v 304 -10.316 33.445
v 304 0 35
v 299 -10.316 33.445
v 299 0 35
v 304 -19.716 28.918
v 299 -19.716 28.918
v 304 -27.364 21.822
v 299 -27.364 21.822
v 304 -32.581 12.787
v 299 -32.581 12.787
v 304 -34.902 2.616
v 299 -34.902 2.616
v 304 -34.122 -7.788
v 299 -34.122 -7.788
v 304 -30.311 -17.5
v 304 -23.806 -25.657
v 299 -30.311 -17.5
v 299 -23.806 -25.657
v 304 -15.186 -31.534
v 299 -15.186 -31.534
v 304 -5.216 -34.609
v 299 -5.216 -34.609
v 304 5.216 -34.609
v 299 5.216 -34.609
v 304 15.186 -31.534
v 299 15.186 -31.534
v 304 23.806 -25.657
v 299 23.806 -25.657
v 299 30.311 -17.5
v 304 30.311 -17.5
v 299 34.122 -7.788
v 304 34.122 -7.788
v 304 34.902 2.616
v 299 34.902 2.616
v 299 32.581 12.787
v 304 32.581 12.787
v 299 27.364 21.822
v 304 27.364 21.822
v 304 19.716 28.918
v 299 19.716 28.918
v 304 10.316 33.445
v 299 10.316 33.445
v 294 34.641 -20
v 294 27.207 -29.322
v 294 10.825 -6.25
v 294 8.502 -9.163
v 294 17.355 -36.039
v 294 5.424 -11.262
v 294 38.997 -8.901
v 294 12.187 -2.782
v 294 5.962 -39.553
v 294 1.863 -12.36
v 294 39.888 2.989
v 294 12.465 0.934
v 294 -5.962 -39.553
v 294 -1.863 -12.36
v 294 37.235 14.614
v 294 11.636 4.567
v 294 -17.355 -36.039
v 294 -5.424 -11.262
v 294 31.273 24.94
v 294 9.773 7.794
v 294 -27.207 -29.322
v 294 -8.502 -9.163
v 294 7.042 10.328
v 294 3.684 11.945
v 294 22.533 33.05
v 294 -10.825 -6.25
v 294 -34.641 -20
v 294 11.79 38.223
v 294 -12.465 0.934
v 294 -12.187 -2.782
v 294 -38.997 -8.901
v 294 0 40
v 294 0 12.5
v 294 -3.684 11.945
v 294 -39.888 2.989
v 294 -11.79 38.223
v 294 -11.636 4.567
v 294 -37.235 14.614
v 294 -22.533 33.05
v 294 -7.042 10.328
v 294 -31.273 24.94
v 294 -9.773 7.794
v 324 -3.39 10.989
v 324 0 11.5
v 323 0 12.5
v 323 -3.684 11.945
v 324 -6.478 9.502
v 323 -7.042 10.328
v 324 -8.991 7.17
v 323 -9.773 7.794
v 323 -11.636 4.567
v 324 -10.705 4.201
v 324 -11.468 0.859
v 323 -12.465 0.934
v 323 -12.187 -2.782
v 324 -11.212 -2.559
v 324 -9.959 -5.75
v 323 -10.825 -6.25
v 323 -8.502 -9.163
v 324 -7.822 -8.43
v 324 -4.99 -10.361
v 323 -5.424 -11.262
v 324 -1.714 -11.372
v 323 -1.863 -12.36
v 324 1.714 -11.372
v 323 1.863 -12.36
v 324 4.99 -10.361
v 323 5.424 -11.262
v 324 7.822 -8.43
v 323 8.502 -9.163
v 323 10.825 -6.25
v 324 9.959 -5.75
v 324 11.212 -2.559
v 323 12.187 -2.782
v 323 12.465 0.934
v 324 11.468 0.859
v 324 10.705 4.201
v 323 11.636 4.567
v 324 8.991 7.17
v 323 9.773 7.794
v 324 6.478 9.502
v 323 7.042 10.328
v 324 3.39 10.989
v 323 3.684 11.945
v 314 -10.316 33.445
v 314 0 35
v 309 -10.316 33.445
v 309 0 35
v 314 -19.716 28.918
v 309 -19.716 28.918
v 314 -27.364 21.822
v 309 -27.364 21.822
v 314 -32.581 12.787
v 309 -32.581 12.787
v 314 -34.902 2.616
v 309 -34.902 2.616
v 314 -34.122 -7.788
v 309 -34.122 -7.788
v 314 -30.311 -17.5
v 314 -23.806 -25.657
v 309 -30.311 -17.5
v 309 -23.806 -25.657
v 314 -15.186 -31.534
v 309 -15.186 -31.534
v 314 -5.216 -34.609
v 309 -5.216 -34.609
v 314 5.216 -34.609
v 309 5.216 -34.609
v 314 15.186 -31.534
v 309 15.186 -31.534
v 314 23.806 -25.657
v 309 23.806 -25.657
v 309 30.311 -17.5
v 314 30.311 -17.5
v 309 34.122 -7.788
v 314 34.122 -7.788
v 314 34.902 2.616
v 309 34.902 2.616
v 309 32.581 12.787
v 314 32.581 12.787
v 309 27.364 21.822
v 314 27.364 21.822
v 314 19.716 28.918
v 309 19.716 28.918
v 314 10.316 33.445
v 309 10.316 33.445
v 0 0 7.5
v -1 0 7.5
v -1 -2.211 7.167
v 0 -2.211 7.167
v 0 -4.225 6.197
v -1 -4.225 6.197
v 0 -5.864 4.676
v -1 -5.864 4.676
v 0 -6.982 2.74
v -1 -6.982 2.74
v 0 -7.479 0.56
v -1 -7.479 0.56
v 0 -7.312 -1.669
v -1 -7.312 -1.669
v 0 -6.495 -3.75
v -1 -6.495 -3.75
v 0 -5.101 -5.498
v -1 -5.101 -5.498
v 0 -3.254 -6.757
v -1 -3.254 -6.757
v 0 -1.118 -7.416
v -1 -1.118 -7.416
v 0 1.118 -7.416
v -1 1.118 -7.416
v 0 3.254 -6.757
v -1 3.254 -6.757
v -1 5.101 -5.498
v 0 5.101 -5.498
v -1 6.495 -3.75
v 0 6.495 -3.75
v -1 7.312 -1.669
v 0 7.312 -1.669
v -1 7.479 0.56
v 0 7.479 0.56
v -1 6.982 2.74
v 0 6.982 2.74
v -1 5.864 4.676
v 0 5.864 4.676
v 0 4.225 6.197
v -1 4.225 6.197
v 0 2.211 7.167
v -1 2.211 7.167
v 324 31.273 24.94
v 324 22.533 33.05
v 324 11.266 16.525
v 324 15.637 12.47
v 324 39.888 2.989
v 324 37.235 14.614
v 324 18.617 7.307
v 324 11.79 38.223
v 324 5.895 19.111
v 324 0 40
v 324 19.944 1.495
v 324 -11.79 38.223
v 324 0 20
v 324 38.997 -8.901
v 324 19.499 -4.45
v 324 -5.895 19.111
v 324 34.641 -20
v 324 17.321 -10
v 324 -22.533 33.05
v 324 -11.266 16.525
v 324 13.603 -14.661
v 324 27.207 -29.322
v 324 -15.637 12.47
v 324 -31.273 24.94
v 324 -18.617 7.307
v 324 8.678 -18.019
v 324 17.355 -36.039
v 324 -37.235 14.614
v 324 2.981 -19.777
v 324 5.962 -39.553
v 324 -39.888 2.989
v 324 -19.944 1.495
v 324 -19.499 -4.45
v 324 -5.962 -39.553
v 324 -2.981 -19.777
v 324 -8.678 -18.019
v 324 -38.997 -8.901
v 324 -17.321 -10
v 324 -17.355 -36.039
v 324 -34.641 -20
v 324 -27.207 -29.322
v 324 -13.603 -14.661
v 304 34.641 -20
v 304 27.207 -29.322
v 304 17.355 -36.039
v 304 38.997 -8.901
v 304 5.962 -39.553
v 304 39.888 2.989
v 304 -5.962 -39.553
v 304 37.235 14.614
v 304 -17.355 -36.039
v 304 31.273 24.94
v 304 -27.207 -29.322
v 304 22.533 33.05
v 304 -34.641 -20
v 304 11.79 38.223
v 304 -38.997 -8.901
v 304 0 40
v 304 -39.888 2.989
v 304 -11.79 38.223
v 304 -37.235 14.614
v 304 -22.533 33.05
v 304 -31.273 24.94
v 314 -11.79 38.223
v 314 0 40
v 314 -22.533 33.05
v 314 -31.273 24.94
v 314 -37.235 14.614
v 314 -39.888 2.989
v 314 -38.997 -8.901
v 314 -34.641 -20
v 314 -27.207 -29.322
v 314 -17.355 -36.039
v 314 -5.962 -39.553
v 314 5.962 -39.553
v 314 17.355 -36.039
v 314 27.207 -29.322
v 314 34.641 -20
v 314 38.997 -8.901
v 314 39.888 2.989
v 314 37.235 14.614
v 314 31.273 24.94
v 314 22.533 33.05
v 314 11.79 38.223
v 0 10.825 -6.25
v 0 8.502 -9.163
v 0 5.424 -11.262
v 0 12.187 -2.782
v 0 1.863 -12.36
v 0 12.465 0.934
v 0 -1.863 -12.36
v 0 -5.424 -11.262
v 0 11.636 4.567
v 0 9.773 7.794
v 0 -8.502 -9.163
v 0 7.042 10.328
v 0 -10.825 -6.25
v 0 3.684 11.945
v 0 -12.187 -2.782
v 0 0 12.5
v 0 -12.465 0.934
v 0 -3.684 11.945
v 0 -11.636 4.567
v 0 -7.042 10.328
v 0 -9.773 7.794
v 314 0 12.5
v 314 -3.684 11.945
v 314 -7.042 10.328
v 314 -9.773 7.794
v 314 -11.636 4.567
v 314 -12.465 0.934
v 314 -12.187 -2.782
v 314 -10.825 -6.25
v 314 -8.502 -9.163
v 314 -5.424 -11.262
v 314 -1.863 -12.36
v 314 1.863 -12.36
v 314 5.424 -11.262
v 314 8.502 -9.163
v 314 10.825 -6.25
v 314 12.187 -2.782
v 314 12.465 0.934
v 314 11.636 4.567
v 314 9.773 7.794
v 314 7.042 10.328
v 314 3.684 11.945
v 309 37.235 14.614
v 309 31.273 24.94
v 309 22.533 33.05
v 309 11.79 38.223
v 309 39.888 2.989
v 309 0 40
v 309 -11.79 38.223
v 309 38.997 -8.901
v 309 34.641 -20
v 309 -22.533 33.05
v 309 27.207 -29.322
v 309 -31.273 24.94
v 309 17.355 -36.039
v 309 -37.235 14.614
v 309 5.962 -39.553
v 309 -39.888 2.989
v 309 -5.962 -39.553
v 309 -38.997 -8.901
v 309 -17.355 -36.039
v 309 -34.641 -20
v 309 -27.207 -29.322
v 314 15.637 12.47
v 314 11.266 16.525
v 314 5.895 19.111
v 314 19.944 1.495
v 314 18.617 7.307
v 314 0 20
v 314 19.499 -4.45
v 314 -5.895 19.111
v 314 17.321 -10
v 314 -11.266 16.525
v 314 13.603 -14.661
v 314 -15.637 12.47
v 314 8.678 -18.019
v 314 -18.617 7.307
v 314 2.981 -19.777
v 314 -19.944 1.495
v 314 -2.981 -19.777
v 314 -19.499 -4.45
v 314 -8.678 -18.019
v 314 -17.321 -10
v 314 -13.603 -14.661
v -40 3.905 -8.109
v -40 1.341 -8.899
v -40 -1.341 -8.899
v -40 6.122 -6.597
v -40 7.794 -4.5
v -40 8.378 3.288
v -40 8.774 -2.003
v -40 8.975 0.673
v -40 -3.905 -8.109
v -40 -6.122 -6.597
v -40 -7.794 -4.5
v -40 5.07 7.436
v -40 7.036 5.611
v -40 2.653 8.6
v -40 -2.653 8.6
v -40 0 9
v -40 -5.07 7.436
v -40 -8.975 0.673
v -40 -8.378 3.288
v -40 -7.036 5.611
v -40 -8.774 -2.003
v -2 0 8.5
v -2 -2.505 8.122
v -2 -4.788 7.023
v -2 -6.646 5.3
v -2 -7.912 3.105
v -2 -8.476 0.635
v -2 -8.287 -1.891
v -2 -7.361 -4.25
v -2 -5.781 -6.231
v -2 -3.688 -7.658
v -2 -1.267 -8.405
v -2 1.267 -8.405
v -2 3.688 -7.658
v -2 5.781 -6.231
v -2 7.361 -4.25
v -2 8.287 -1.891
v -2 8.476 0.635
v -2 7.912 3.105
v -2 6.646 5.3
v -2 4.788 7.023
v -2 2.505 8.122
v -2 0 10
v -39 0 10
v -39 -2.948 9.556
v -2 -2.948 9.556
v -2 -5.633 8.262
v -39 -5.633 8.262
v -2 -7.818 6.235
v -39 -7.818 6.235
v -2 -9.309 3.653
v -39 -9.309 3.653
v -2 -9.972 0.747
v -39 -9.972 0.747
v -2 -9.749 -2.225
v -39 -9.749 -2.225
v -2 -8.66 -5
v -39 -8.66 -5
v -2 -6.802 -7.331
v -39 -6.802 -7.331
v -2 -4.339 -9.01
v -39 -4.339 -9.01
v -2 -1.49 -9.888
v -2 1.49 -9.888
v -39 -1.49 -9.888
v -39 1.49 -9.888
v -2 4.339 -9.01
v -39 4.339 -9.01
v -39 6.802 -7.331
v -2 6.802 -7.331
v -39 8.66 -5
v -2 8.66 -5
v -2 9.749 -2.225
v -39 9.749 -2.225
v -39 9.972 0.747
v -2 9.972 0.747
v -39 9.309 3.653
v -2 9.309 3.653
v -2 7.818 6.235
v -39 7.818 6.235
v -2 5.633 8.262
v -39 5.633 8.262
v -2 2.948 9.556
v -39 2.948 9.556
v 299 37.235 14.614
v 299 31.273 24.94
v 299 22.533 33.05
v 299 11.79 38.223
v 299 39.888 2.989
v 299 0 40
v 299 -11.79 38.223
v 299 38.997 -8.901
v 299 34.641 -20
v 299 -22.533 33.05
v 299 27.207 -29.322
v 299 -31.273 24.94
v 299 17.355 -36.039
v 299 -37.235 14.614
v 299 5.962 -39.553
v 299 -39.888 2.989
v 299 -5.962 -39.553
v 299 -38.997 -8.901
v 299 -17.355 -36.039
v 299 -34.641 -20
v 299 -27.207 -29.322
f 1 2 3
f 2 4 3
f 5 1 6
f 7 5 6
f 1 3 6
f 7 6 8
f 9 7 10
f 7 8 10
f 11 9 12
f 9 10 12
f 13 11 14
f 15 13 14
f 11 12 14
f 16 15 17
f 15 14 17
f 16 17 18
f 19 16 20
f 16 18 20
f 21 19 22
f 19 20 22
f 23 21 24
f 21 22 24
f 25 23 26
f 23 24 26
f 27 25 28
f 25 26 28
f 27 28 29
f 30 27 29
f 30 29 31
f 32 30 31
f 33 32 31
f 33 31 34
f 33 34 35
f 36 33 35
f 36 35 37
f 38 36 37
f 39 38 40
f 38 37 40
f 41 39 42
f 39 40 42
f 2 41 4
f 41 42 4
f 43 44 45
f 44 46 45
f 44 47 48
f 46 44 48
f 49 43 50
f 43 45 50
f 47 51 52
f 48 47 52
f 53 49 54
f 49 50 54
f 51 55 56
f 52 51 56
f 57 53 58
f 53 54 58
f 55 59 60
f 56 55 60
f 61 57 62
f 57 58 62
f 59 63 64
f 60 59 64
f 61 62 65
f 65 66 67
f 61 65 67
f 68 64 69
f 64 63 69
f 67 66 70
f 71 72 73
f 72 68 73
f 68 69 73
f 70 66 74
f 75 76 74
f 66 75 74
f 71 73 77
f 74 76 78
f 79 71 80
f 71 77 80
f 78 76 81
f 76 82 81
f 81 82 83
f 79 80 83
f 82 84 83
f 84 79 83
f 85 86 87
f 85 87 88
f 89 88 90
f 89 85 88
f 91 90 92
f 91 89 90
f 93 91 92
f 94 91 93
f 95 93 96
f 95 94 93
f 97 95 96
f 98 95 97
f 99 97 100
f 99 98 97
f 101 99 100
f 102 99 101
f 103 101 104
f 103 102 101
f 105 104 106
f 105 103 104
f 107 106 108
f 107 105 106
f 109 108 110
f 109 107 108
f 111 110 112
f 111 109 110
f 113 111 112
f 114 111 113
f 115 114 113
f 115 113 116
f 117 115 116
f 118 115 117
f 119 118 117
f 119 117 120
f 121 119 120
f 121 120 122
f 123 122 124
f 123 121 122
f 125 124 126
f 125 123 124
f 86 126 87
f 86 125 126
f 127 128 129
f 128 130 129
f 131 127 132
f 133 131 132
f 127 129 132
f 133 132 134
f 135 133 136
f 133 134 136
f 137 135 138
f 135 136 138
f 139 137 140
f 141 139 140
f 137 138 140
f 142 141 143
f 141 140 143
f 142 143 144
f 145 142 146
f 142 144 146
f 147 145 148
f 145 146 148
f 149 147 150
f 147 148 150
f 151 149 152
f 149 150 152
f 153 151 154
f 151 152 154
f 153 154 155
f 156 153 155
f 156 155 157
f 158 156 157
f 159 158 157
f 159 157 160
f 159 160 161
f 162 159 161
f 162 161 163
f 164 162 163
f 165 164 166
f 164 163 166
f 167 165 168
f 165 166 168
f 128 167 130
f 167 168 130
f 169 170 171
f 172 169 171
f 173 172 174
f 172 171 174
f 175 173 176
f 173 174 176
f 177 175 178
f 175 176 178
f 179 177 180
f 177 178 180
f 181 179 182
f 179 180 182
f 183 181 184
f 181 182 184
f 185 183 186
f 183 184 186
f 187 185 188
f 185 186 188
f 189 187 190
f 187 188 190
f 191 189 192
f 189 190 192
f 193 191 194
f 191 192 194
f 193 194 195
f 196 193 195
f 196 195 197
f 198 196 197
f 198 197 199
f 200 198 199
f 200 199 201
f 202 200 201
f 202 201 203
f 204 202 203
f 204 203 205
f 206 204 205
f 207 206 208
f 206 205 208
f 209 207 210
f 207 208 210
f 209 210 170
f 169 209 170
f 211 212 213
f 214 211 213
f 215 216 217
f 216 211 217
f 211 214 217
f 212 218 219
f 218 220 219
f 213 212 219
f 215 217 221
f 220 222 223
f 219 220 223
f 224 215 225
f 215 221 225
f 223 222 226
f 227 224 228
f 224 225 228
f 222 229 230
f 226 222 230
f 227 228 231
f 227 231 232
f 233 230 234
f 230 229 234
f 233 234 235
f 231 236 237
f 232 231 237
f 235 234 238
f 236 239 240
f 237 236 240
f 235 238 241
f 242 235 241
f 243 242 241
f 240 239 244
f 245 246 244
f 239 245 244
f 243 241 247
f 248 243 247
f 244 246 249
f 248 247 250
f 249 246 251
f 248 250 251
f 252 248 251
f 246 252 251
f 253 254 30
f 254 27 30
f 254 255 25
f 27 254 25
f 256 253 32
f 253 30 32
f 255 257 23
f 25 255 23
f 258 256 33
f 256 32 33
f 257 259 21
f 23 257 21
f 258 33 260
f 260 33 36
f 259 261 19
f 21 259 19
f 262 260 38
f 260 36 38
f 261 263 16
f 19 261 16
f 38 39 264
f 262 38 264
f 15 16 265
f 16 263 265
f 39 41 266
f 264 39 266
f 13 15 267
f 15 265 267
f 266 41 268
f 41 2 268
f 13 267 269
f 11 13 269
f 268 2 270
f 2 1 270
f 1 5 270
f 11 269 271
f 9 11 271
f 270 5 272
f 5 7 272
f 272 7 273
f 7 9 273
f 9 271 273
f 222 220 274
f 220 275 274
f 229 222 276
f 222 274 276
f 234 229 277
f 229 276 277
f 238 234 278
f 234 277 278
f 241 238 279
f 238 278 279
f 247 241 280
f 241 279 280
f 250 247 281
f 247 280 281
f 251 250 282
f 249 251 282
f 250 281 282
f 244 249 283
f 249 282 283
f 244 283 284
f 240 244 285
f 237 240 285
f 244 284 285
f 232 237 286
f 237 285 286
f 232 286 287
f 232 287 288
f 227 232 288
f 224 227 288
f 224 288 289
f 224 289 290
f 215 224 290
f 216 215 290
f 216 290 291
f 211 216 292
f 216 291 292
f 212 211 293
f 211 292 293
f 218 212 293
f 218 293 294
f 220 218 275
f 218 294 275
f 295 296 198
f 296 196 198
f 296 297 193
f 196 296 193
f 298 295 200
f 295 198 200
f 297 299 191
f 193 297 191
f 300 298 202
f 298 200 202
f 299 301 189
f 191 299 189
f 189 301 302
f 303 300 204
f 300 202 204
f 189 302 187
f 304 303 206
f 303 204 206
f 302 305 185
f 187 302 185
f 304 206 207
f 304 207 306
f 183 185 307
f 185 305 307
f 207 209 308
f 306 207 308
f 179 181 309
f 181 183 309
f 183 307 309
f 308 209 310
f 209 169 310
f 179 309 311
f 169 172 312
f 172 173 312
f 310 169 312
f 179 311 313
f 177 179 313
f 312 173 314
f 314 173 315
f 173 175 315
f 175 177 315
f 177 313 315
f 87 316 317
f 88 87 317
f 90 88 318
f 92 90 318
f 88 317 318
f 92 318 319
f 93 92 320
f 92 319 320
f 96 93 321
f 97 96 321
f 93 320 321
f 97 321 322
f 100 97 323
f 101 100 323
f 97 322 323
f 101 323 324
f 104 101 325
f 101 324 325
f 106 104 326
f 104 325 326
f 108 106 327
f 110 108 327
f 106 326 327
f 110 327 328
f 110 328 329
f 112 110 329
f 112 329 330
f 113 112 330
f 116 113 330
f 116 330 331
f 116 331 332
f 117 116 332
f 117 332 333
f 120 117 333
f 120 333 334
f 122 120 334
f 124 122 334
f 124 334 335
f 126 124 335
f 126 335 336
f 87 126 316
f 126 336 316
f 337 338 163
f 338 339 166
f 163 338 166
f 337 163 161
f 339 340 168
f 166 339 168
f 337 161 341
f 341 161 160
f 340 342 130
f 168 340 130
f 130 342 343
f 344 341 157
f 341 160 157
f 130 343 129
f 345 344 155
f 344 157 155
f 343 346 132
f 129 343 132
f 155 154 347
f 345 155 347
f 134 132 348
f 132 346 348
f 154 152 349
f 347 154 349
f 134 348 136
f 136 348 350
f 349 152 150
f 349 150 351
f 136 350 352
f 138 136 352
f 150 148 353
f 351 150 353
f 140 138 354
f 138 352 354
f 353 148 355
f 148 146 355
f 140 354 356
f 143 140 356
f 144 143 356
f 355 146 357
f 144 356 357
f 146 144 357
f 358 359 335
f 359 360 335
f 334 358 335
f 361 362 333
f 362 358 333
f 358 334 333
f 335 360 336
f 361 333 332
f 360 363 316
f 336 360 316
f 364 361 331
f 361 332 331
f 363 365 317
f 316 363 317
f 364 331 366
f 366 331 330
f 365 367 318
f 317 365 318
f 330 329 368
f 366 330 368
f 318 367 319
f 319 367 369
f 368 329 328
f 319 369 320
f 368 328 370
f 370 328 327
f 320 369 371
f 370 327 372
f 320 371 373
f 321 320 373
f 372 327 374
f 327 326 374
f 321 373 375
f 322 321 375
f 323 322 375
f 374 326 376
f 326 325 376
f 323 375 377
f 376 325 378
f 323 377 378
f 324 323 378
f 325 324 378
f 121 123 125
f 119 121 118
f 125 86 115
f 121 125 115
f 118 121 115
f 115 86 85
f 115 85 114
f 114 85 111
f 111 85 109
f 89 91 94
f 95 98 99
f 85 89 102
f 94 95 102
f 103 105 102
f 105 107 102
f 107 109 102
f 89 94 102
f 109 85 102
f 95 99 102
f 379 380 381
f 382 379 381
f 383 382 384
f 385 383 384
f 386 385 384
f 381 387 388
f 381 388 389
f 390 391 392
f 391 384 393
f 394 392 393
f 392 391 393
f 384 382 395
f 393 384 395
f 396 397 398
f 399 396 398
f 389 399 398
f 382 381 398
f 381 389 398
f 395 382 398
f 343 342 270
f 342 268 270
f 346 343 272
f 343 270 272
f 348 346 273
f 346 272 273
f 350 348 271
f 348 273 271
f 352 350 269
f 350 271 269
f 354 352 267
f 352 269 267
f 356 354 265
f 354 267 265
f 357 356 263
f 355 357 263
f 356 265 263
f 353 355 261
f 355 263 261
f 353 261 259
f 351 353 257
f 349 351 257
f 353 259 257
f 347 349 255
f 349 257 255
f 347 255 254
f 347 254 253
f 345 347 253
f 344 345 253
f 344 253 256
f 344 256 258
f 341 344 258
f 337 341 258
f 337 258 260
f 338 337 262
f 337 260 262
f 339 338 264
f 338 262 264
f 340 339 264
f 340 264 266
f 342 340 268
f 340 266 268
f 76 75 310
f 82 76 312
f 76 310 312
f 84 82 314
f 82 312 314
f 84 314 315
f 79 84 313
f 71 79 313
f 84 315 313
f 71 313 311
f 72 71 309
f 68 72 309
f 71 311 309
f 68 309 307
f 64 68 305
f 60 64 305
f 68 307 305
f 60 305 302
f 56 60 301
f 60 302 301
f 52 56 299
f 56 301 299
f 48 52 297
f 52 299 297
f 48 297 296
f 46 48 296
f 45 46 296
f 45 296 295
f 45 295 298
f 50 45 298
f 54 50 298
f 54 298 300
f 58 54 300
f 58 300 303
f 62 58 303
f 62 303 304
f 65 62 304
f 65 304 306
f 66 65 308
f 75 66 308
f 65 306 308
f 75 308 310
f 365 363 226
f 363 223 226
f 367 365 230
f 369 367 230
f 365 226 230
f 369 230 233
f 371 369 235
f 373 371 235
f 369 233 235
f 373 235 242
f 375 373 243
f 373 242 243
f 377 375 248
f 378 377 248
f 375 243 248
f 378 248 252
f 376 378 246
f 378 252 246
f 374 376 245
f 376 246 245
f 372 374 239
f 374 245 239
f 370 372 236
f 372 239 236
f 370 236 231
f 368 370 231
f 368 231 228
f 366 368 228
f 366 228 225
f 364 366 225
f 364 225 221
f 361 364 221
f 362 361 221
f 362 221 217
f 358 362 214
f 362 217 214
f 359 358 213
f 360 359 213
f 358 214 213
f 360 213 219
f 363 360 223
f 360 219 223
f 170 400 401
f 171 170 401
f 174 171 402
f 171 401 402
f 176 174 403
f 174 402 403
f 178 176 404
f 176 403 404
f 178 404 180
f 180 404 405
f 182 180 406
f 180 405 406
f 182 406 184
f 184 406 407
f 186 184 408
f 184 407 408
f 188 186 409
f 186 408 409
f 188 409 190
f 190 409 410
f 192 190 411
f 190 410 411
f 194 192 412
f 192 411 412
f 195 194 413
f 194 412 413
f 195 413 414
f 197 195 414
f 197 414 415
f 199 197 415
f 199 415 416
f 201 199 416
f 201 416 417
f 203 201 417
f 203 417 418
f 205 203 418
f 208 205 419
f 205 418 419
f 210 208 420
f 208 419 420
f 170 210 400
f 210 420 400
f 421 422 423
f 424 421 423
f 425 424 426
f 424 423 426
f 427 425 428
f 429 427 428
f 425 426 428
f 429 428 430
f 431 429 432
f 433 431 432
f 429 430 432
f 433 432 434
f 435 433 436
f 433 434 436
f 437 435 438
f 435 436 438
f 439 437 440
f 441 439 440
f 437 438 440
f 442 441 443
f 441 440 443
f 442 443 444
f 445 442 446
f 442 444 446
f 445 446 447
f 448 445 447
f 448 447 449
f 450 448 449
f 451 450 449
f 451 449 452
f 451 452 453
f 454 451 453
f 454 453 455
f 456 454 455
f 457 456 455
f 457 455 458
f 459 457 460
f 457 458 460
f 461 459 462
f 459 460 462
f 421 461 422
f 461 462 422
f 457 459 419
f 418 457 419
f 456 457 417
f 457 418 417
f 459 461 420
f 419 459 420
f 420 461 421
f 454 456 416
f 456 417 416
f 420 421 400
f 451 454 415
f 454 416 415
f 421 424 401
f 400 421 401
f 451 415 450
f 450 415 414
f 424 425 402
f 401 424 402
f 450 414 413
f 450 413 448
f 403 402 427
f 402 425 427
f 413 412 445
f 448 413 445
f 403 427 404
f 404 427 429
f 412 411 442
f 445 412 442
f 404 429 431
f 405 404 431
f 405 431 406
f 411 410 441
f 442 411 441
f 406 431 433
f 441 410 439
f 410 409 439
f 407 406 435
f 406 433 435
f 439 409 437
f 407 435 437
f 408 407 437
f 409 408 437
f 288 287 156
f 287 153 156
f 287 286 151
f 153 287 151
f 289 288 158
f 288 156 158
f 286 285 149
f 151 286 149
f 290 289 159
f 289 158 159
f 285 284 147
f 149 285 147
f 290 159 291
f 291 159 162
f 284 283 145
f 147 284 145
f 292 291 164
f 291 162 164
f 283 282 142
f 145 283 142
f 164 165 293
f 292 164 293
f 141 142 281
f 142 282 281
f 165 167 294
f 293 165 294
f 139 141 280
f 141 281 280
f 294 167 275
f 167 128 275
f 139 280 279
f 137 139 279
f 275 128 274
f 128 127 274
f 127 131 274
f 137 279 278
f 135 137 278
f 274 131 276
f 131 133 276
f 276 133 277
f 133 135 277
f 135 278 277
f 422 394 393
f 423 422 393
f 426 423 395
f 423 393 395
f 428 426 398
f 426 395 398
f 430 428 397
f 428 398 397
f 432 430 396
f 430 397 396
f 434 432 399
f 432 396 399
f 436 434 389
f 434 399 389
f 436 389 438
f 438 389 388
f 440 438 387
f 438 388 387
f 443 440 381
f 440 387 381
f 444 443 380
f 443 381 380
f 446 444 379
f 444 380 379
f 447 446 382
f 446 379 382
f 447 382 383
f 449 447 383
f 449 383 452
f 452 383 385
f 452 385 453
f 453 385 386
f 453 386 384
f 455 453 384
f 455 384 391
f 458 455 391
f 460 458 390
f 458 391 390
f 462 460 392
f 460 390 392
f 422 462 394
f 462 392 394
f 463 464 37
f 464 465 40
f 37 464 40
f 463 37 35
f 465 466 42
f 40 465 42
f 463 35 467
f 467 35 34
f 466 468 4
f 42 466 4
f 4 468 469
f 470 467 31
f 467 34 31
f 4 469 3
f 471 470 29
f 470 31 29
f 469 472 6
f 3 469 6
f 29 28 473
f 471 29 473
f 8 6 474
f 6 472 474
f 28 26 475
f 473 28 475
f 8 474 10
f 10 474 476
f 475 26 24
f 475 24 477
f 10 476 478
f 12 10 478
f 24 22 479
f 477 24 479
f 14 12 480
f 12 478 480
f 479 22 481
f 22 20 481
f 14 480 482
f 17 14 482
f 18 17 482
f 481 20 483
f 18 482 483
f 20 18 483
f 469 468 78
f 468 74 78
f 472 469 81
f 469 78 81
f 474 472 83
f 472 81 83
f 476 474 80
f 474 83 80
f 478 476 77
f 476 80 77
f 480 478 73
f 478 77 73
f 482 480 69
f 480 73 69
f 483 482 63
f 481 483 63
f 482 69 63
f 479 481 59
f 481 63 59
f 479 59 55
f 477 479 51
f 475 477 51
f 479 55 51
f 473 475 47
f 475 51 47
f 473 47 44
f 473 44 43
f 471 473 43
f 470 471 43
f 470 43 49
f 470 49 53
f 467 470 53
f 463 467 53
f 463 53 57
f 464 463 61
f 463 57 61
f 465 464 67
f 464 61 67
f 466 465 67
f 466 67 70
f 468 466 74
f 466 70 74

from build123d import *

# Parameters (mm, degrees)
F2_SIZE = 1
F3_SIZE = 1


# Not quite as in the source:
# - a feature names something its author has since deleted; it is built from what else it names


with BuildPart() as f1:
    # F0 (on Front) → F1 (revolve)
    with BuildSketch(Plane.XZ):
        Polygon((294, 12.5), (0, 12.5), (0, 7.5), (-2, 7.5), (-2, 10), (-40, 10), (-40, 0), (324, 0), (324, 12.5), (314, 12.5), (314, 20), (324, 20), (324, 40), (314, 40), (314, 35), (309, 35), (309, 40), (304, 40), (304, 35), (299, 35), (299, 40), (294, 40), align=None)
    revolve(axis=Axis((142, 0, 0), (1, 0, 0)))

    # F2
    f2_edges = [f1.edges().sort_by_distance(p)[0] for p in [
        (-2, 0, -7.5),
        (-40, 0, -10),
    ]]
    chamfer(f2_edges, length=F2_SIZE)

    # F3
    f3_edges = [f1.edges().sort_by_distance(p)[0] for p in [
        (324, 0, -12.5),
    ]]
    chamfer(f3_edges, length=F3_SIZE)


solid = f1.part
